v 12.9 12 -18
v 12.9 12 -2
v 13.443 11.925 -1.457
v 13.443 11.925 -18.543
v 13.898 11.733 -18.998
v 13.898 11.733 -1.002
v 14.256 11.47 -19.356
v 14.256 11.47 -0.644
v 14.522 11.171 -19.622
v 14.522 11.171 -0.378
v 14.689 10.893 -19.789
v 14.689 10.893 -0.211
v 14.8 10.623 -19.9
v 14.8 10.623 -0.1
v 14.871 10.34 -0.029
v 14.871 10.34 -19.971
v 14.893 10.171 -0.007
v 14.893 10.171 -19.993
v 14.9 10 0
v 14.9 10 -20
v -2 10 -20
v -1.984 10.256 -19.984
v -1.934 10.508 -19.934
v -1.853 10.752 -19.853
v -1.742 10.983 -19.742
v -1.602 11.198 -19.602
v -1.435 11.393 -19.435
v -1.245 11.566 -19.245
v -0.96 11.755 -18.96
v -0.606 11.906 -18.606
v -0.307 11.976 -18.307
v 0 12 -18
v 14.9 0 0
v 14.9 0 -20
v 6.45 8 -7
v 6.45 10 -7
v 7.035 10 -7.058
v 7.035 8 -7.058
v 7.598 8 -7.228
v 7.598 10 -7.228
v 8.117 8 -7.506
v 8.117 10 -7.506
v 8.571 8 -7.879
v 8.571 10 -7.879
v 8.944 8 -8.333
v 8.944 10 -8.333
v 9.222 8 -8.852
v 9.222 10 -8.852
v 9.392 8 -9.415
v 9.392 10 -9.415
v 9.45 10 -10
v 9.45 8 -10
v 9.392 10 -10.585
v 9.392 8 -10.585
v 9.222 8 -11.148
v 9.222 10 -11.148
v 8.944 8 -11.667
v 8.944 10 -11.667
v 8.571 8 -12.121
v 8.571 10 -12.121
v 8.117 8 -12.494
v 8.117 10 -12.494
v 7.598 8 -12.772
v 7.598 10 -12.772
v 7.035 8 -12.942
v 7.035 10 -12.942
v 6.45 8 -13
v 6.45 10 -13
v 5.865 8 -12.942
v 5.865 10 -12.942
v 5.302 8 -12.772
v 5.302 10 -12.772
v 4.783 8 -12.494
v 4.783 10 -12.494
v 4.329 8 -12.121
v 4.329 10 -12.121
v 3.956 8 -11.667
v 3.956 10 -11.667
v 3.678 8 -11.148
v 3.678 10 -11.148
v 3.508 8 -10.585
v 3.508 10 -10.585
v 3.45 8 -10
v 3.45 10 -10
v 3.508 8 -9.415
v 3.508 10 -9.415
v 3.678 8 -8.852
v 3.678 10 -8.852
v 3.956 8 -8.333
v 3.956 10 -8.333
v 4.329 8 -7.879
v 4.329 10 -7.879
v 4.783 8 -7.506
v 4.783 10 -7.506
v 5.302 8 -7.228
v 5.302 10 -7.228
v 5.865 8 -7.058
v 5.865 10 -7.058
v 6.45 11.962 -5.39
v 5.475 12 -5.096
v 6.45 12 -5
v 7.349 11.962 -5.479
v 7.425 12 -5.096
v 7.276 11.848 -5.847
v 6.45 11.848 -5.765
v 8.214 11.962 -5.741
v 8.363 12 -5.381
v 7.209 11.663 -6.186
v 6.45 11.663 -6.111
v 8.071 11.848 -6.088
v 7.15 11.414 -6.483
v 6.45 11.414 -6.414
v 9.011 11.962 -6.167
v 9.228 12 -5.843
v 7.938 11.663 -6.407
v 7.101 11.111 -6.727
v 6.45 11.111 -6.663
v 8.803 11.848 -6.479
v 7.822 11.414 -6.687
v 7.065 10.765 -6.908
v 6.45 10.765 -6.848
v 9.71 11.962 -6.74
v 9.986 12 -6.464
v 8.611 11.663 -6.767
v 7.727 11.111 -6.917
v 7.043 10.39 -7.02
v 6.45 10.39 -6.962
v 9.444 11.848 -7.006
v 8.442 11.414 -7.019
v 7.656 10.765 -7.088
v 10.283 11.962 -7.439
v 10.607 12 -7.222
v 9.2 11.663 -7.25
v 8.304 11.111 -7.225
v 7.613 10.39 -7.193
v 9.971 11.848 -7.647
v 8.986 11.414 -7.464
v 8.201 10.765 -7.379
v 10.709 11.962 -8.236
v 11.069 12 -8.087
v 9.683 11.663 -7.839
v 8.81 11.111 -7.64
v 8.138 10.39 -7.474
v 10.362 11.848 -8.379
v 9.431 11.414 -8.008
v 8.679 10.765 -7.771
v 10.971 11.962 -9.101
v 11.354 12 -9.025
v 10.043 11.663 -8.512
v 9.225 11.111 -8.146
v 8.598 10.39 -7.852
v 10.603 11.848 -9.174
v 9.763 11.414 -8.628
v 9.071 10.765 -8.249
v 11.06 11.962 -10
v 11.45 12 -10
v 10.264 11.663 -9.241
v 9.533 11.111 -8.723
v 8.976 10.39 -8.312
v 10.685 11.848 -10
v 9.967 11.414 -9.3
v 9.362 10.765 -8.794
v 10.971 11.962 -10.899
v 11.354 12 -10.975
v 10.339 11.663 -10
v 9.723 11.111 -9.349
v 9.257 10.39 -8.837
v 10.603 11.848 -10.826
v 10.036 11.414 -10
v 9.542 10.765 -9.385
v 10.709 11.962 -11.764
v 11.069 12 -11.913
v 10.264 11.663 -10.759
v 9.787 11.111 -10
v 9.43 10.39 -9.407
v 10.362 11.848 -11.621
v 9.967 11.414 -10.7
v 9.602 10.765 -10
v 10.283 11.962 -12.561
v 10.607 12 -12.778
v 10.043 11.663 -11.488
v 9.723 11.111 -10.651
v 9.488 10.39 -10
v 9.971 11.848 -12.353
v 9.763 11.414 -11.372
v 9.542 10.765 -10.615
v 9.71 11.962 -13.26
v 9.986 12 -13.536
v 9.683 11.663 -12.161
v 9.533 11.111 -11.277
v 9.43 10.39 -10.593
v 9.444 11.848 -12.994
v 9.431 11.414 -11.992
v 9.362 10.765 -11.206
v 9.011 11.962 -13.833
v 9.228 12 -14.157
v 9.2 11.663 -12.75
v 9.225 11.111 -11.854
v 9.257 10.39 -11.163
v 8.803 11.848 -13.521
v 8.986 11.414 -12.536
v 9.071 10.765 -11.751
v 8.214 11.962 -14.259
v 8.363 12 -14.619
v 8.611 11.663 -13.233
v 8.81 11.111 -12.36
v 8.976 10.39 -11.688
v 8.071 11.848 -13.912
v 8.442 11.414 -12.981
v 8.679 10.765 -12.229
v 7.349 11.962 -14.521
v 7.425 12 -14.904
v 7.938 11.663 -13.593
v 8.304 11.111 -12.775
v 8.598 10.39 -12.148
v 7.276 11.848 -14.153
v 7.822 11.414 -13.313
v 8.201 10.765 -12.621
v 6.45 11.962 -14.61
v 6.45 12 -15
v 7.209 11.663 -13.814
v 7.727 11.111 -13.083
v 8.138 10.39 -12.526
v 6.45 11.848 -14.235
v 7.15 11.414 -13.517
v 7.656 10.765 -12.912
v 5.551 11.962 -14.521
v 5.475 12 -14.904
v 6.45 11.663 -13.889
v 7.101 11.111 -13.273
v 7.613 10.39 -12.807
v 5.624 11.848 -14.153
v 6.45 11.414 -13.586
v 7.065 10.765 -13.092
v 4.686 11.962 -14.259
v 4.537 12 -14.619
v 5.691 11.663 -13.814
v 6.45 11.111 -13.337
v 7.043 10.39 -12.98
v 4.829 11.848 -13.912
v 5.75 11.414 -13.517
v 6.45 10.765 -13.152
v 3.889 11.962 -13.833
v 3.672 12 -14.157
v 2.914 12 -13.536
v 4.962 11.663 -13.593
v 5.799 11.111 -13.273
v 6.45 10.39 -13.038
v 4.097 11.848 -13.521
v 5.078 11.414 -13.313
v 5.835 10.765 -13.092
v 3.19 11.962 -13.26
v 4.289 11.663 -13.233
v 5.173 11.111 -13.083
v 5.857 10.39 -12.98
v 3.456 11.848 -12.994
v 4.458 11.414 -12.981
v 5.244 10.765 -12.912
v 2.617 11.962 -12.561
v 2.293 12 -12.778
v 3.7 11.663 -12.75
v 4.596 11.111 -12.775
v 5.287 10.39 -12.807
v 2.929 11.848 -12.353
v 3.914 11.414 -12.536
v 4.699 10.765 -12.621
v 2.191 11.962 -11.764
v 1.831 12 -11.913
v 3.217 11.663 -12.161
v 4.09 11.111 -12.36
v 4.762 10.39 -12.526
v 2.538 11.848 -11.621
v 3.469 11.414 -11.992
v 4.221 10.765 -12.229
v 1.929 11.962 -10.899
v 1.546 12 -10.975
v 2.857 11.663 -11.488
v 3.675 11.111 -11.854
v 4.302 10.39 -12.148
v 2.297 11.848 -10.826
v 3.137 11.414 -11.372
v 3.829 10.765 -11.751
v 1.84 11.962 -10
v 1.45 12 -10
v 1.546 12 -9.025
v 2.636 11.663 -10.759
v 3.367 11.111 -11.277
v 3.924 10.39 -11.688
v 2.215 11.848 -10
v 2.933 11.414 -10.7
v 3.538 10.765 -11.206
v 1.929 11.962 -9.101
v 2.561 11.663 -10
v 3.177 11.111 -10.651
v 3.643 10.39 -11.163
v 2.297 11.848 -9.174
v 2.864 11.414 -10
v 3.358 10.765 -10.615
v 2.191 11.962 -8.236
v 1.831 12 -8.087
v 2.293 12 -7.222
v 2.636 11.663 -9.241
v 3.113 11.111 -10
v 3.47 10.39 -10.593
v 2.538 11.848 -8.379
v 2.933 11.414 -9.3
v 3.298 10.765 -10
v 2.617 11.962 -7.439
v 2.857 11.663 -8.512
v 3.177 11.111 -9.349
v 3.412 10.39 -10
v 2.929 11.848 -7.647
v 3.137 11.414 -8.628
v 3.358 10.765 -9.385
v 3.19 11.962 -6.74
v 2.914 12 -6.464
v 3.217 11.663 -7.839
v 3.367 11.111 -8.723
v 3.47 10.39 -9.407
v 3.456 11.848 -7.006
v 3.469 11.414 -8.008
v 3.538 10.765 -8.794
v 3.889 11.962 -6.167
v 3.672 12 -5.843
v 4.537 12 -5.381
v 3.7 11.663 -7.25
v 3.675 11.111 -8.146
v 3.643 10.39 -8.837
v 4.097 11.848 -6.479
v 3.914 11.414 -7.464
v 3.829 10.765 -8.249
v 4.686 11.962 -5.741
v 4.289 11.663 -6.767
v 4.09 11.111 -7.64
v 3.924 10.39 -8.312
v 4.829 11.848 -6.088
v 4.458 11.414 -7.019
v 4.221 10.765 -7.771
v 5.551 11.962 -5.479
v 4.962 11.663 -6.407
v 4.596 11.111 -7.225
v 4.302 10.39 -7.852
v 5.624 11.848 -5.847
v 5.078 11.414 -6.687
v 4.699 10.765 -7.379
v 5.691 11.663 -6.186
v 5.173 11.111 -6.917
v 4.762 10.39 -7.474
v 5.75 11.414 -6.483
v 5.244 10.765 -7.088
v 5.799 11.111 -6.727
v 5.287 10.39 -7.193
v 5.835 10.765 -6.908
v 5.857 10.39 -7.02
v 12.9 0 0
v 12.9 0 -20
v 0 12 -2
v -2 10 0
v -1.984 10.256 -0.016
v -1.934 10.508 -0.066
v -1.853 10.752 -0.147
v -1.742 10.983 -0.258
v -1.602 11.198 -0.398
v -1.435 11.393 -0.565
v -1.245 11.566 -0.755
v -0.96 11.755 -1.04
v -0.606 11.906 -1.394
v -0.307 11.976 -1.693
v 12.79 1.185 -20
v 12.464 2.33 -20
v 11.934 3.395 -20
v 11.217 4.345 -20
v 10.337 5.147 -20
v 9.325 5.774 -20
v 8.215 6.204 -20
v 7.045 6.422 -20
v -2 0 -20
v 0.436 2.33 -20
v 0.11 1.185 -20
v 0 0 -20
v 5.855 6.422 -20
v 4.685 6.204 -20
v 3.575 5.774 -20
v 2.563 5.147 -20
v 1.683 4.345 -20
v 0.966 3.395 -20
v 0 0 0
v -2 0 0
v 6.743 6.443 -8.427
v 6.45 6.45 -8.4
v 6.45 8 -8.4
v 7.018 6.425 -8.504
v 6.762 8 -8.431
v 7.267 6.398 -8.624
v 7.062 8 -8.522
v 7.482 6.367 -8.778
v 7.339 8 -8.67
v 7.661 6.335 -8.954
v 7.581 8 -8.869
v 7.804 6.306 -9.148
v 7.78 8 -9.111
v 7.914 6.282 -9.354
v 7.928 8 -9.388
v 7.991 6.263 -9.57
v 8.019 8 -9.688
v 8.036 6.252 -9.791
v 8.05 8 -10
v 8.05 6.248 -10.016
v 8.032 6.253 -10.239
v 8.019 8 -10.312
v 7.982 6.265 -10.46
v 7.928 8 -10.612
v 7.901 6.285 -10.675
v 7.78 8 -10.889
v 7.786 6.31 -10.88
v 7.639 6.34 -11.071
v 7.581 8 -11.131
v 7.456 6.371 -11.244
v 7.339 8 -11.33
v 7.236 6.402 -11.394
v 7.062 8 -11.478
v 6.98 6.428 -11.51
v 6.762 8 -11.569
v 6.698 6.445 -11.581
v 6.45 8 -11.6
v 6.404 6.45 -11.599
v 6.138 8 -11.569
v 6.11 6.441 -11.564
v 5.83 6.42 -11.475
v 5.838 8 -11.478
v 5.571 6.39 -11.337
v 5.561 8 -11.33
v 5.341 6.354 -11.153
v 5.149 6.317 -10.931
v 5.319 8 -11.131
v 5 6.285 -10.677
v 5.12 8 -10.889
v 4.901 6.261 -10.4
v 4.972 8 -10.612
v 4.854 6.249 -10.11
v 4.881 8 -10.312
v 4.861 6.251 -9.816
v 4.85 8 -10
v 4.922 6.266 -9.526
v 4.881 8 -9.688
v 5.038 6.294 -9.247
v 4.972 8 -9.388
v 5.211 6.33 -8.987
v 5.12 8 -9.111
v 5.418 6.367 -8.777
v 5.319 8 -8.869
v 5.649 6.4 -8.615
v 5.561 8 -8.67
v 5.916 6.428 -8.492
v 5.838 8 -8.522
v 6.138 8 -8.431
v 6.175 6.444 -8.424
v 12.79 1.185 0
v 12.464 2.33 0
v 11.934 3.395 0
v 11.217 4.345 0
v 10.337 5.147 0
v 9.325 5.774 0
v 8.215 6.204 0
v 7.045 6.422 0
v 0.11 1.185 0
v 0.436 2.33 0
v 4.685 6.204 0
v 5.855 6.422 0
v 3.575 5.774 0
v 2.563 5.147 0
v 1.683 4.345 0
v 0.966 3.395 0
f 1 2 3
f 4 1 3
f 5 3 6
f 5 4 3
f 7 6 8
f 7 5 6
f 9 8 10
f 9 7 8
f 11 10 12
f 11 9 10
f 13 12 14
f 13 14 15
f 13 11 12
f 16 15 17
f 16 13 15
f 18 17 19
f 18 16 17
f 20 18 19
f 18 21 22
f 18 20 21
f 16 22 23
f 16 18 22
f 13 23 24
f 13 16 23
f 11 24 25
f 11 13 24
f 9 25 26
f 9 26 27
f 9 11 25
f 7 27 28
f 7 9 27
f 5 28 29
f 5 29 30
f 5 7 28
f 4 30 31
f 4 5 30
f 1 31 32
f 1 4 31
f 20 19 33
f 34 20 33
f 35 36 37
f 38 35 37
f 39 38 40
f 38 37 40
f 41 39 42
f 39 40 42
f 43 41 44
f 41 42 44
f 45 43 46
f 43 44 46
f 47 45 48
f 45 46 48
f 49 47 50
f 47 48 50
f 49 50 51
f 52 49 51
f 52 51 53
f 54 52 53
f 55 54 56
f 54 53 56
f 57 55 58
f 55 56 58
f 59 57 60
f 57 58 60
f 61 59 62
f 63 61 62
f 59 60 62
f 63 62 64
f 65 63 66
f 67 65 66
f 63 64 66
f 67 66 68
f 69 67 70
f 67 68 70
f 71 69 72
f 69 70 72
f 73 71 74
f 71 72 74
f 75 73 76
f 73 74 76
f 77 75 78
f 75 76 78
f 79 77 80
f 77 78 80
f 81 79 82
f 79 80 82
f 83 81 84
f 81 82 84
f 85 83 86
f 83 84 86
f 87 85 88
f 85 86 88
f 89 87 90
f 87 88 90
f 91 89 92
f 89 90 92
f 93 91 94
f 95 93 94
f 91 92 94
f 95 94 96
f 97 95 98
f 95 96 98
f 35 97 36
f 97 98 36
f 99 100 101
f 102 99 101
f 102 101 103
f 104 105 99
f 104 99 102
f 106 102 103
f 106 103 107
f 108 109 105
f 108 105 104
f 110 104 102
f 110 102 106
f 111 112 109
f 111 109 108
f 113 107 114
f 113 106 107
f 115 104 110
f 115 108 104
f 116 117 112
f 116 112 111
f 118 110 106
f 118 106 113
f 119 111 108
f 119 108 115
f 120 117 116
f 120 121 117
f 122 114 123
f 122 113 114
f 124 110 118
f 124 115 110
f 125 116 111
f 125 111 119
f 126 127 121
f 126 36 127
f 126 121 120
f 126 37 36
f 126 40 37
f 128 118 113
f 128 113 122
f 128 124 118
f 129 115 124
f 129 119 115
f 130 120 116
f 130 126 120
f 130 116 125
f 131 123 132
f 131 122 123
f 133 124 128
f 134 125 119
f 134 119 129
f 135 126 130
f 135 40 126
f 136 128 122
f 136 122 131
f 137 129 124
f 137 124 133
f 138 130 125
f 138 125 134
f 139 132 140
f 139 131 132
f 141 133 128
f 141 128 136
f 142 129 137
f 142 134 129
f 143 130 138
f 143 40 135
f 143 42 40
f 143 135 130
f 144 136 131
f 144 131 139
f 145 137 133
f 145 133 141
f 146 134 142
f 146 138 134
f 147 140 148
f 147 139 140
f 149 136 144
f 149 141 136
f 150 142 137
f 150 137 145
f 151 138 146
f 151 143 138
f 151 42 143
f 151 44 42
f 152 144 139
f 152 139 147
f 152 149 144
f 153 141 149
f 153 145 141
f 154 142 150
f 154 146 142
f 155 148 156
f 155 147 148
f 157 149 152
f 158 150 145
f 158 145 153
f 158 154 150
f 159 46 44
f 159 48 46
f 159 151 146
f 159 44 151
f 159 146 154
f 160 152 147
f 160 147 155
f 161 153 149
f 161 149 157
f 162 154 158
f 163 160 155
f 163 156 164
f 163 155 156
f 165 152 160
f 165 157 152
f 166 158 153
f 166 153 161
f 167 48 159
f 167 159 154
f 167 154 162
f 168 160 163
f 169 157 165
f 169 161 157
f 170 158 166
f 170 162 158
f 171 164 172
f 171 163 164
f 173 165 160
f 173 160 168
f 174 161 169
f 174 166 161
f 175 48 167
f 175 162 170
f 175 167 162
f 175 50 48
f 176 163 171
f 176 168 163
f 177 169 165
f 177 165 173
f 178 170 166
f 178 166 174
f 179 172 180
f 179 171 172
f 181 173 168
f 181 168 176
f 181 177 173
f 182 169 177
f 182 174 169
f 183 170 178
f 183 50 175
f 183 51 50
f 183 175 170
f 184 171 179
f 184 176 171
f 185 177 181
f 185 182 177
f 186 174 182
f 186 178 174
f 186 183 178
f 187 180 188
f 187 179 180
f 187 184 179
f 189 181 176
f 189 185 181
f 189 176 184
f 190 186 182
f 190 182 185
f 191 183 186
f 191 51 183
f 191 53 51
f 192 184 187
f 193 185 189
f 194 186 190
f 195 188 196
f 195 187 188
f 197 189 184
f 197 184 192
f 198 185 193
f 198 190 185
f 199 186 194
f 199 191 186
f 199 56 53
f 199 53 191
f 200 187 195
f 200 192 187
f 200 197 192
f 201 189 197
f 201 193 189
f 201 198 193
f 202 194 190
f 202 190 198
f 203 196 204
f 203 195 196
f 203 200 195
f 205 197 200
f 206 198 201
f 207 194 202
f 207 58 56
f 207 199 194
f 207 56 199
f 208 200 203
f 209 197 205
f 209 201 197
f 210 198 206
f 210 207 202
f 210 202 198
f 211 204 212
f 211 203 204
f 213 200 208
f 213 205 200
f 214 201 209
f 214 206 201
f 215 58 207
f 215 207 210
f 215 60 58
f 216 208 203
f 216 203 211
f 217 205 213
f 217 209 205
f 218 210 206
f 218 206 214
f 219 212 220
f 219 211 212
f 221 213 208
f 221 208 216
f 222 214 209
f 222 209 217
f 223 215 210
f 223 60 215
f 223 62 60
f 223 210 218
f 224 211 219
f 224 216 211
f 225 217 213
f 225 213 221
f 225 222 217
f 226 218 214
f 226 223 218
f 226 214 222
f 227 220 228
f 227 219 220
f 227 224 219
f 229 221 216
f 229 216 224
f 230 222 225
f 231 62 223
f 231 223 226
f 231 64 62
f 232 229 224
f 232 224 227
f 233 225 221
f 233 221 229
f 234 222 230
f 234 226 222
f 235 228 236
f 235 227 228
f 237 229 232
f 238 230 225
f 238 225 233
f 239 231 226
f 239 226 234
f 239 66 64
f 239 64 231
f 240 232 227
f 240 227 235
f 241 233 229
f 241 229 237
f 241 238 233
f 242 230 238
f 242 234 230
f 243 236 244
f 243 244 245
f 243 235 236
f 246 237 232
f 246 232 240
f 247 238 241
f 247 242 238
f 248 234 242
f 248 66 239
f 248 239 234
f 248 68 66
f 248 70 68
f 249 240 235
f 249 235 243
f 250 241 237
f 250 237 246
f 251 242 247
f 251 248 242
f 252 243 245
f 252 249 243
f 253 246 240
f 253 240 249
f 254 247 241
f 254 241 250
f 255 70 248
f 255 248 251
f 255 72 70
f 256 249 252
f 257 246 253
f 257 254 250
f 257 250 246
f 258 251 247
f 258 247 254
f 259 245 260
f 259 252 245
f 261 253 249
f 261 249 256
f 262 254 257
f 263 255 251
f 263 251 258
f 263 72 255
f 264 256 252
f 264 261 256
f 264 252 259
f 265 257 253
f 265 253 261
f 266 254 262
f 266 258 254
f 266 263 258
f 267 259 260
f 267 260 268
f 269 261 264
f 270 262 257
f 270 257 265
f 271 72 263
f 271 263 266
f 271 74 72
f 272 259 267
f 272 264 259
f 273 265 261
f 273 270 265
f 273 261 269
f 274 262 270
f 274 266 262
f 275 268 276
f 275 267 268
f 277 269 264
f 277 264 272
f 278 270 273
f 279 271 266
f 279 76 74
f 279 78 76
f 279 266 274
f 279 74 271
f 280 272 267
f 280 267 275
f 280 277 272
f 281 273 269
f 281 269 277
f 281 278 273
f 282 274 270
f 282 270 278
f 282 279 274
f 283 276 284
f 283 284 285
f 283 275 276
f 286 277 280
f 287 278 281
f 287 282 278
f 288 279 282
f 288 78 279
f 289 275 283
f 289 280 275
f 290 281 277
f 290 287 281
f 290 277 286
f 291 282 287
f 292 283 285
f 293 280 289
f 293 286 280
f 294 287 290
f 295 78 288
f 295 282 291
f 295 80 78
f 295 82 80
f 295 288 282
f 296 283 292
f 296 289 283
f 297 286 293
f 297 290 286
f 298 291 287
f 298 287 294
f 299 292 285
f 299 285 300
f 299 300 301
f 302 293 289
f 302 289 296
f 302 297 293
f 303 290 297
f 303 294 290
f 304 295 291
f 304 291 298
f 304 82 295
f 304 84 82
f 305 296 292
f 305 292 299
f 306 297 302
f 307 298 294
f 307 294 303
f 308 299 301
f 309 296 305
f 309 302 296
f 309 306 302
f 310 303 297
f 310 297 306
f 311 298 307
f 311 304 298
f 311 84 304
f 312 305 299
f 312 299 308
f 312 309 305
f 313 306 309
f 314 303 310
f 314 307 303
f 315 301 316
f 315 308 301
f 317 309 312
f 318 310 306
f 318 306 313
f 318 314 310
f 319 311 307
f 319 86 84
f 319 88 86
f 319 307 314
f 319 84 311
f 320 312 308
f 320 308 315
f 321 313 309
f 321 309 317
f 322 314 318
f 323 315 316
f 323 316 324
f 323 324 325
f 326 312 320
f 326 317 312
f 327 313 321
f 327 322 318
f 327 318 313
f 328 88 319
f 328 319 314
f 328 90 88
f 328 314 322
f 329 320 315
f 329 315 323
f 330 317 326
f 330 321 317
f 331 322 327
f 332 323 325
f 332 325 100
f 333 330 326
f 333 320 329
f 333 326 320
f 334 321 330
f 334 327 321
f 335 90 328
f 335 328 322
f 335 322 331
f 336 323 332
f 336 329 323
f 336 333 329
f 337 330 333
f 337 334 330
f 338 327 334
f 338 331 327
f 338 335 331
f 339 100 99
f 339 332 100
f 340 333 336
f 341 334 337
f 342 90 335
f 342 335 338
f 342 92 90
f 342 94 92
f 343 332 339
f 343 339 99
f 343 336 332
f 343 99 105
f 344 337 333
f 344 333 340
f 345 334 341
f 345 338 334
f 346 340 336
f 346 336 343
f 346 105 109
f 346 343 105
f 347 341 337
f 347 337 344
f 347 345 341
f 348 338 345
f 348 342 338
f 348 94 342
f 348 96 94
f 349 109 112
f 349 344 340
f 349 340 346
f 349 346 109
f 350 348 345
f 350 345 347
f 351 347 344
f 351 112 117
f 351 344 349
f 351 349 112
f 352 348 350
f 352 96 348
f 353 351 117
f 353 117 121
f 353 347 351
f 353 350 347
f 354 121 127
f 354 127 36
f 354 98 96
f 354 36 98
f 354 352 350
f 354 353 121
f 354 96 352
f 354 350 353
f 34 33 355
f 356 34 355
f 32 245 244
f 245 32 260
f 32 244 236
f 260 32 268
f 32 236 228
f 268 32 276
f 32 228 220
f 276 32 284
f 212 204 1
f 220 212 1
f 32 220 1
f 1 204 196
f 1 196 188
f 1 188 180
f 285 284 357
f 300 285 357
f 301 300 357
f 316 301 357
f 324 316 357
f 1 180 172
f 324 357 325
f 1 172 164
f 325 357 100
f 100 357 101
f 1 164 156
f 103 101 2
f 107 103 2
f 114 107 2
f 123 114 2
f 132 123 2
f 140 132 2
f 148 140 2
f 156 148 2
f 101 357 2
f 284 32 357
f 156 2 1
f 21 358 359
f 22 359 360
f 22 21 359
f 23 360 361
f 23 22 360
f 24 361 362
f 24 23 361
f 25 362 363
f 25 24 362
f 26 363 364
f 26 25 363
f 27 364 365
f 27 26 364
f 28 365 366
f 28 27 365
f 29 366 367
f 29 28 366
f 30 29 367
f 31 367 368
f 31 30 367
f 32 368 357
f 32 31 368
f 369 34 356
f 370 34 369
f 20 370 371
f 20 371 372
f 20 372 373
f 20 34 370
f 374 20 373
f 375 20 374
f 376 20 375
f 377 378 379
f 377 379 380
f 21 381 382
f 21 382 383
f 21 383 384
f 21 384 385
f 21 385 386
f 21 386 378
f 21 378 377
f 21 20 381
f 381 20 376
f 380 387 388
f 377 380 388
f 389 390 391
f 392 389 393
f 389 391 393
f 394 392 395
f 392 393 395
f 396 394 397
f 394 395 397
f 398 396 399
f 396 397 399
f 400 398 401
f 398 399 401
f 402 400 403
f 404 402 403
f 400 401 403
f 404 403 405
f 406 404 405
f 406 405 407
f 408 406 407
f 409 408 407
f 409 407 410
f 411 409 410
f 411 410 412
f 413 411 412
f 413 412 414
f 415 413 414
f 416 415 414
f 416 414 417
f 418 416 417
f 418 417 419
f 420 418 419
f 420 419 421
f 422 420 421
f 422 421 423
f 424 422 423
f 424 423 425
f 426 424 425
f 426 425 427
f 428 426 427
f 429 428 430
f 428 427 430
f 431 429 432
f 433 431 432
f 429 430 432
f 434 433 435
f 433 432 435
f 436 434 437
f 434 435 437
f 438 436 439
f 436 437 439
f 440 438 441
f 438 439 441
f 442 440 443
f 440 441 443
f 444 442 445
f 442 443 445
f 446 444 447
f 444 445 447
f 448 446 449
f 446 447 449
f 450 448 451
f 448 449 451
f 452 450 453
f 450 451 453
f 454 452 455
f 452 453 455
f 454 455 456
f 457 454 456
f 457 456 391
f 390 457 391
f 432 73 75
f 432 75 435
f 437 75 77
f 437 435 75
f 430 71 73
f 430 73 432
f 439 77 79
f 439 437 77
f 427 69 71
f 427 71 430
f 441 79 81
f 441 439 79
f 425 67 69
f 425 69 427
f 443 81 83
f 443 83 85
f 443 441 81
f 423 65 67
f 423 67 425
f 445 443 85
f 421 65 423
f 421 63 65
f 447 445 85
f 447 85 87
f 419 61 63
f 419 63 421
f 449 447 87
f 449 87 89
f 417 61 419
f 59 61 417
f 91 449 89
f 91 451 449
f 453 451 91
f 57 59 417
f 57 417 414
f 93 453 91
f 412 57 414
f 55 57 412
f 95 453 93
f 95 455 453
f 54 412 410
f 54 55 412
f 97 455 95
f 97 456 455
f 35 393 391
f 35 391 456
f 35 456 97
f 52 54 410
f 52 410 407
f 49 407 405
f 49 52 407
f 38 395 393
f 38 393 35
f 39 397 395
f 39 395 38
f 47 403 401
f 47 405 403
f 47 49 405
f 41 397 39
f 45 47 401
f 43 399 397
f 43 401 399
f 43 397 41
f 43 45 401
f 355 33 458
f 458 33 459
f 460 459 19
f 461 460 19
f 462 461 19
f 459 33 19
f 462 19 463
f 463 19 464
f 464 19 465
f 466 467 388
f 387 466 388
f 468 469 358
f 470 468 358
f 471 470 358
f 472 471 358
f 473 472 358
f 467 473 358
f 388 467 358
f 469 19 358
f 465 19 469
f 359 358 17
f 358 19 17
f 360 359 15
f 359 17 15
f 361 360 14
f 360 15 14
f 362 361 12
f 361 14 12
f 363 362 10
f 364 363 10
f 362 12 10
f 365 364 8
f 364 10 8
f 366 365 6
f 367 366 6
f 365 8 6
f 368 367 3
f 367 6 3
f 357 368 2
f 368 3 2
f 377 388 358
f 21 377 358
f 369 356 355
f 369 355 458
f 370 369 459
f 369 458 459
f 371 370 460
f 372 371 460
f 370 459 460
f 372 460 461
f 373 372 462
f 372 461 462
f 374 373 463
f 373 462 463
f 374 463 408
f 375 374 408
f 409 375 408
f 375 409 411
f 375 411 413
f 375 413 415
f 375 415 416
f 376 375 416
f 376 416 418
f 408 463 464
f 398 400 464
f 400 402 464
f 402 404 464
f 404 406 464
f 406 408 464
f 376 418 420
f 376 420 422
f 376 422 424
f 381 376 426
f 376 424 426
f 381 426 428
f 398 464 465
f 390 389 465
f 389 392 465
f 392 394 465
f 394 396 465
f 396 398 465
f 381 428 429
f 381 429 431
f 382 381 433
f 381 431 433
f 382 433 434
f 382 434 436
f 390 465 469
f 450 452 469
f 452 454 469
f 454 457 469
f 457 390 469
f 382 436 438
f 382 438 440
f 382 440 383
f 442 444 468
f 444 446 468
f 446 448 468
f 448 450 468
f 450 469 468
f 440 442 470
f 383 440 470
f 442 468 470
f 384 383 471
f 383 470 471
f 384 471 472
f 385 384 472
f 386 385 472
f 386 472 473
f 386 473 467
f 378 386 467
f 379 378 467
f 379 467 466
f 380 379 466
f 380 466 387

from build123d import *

# Parameters (mm, degrees)
BOSS_EXTRUDE1_DEPTH = 20
SKETCH3_R           = 1.6
CUT_EXTRUDE1_DEPTH  = 20
SKETCH4_R           = 3
CUT_EXTRUDE2_DEPTH  = 4
FILLET5_R           = 2


with BuildPart() as part:
    # Sketch2 → Boss-Extrude1 (new body)
    with BuildSketch(Plane.XY):
        with BuildLine():
            Line((0, 0), (-2, 0))
            Line((-2, 0), (-2, 12))
            Line((-2, 12), (14.9, 12))
            Line((14.9, 12), (14.9, 0))
            Line((14.9, 0), (12.9, 0))
            ThreePointArc((12.9, 0), (6.45, 6.45), (0, 0))
        make_face()
    extrude(amount=-BOSS_EXTRUDE1_DEPTH)

    # Sketch3 → Cut-Extrude1 (cut)
    with BuildSketch(Plane(origin=(0, 12, 0), x_dir=(1, 0, 0), z_dir=(0, 1, 0))):
        with Locations(Location((6.45, 10, 0), (0, 0, 270))):
            Circle(SKETCH3_R)
    extrude(amount=-CUT_EXTRUDE1_DEPTH, mode=Mode.SUBTRACT)

    # Sketch4 → Cut-Extrude2 (cut)
    with BuildSketch(Plane(origin=(0, 12, 0), x_dir=(1, 0, 0), z_dir=(0, 1, 0))):
        with Locations(Location((6.45, 10, 0), (0, 0, 270))):
            Circle(SKETCH4_R)
    extrude(amount=-CUT_EXTRUDE2_DEPTH, mode=Mode.SUBTRACT)

    # Fillet5
    fillet5_edges = [part.edges().sort_by_distance(p)[0] for p in [
        (-2, 12, -10),
        (14.9, 12, -10),
        (6.45, 12, -20),
        (6.45, 12, -13),
        (6.45, 12, 0),
    ]]
    fillet(fillet5_edges, radius=FILLET5_R)


solid = part.part
